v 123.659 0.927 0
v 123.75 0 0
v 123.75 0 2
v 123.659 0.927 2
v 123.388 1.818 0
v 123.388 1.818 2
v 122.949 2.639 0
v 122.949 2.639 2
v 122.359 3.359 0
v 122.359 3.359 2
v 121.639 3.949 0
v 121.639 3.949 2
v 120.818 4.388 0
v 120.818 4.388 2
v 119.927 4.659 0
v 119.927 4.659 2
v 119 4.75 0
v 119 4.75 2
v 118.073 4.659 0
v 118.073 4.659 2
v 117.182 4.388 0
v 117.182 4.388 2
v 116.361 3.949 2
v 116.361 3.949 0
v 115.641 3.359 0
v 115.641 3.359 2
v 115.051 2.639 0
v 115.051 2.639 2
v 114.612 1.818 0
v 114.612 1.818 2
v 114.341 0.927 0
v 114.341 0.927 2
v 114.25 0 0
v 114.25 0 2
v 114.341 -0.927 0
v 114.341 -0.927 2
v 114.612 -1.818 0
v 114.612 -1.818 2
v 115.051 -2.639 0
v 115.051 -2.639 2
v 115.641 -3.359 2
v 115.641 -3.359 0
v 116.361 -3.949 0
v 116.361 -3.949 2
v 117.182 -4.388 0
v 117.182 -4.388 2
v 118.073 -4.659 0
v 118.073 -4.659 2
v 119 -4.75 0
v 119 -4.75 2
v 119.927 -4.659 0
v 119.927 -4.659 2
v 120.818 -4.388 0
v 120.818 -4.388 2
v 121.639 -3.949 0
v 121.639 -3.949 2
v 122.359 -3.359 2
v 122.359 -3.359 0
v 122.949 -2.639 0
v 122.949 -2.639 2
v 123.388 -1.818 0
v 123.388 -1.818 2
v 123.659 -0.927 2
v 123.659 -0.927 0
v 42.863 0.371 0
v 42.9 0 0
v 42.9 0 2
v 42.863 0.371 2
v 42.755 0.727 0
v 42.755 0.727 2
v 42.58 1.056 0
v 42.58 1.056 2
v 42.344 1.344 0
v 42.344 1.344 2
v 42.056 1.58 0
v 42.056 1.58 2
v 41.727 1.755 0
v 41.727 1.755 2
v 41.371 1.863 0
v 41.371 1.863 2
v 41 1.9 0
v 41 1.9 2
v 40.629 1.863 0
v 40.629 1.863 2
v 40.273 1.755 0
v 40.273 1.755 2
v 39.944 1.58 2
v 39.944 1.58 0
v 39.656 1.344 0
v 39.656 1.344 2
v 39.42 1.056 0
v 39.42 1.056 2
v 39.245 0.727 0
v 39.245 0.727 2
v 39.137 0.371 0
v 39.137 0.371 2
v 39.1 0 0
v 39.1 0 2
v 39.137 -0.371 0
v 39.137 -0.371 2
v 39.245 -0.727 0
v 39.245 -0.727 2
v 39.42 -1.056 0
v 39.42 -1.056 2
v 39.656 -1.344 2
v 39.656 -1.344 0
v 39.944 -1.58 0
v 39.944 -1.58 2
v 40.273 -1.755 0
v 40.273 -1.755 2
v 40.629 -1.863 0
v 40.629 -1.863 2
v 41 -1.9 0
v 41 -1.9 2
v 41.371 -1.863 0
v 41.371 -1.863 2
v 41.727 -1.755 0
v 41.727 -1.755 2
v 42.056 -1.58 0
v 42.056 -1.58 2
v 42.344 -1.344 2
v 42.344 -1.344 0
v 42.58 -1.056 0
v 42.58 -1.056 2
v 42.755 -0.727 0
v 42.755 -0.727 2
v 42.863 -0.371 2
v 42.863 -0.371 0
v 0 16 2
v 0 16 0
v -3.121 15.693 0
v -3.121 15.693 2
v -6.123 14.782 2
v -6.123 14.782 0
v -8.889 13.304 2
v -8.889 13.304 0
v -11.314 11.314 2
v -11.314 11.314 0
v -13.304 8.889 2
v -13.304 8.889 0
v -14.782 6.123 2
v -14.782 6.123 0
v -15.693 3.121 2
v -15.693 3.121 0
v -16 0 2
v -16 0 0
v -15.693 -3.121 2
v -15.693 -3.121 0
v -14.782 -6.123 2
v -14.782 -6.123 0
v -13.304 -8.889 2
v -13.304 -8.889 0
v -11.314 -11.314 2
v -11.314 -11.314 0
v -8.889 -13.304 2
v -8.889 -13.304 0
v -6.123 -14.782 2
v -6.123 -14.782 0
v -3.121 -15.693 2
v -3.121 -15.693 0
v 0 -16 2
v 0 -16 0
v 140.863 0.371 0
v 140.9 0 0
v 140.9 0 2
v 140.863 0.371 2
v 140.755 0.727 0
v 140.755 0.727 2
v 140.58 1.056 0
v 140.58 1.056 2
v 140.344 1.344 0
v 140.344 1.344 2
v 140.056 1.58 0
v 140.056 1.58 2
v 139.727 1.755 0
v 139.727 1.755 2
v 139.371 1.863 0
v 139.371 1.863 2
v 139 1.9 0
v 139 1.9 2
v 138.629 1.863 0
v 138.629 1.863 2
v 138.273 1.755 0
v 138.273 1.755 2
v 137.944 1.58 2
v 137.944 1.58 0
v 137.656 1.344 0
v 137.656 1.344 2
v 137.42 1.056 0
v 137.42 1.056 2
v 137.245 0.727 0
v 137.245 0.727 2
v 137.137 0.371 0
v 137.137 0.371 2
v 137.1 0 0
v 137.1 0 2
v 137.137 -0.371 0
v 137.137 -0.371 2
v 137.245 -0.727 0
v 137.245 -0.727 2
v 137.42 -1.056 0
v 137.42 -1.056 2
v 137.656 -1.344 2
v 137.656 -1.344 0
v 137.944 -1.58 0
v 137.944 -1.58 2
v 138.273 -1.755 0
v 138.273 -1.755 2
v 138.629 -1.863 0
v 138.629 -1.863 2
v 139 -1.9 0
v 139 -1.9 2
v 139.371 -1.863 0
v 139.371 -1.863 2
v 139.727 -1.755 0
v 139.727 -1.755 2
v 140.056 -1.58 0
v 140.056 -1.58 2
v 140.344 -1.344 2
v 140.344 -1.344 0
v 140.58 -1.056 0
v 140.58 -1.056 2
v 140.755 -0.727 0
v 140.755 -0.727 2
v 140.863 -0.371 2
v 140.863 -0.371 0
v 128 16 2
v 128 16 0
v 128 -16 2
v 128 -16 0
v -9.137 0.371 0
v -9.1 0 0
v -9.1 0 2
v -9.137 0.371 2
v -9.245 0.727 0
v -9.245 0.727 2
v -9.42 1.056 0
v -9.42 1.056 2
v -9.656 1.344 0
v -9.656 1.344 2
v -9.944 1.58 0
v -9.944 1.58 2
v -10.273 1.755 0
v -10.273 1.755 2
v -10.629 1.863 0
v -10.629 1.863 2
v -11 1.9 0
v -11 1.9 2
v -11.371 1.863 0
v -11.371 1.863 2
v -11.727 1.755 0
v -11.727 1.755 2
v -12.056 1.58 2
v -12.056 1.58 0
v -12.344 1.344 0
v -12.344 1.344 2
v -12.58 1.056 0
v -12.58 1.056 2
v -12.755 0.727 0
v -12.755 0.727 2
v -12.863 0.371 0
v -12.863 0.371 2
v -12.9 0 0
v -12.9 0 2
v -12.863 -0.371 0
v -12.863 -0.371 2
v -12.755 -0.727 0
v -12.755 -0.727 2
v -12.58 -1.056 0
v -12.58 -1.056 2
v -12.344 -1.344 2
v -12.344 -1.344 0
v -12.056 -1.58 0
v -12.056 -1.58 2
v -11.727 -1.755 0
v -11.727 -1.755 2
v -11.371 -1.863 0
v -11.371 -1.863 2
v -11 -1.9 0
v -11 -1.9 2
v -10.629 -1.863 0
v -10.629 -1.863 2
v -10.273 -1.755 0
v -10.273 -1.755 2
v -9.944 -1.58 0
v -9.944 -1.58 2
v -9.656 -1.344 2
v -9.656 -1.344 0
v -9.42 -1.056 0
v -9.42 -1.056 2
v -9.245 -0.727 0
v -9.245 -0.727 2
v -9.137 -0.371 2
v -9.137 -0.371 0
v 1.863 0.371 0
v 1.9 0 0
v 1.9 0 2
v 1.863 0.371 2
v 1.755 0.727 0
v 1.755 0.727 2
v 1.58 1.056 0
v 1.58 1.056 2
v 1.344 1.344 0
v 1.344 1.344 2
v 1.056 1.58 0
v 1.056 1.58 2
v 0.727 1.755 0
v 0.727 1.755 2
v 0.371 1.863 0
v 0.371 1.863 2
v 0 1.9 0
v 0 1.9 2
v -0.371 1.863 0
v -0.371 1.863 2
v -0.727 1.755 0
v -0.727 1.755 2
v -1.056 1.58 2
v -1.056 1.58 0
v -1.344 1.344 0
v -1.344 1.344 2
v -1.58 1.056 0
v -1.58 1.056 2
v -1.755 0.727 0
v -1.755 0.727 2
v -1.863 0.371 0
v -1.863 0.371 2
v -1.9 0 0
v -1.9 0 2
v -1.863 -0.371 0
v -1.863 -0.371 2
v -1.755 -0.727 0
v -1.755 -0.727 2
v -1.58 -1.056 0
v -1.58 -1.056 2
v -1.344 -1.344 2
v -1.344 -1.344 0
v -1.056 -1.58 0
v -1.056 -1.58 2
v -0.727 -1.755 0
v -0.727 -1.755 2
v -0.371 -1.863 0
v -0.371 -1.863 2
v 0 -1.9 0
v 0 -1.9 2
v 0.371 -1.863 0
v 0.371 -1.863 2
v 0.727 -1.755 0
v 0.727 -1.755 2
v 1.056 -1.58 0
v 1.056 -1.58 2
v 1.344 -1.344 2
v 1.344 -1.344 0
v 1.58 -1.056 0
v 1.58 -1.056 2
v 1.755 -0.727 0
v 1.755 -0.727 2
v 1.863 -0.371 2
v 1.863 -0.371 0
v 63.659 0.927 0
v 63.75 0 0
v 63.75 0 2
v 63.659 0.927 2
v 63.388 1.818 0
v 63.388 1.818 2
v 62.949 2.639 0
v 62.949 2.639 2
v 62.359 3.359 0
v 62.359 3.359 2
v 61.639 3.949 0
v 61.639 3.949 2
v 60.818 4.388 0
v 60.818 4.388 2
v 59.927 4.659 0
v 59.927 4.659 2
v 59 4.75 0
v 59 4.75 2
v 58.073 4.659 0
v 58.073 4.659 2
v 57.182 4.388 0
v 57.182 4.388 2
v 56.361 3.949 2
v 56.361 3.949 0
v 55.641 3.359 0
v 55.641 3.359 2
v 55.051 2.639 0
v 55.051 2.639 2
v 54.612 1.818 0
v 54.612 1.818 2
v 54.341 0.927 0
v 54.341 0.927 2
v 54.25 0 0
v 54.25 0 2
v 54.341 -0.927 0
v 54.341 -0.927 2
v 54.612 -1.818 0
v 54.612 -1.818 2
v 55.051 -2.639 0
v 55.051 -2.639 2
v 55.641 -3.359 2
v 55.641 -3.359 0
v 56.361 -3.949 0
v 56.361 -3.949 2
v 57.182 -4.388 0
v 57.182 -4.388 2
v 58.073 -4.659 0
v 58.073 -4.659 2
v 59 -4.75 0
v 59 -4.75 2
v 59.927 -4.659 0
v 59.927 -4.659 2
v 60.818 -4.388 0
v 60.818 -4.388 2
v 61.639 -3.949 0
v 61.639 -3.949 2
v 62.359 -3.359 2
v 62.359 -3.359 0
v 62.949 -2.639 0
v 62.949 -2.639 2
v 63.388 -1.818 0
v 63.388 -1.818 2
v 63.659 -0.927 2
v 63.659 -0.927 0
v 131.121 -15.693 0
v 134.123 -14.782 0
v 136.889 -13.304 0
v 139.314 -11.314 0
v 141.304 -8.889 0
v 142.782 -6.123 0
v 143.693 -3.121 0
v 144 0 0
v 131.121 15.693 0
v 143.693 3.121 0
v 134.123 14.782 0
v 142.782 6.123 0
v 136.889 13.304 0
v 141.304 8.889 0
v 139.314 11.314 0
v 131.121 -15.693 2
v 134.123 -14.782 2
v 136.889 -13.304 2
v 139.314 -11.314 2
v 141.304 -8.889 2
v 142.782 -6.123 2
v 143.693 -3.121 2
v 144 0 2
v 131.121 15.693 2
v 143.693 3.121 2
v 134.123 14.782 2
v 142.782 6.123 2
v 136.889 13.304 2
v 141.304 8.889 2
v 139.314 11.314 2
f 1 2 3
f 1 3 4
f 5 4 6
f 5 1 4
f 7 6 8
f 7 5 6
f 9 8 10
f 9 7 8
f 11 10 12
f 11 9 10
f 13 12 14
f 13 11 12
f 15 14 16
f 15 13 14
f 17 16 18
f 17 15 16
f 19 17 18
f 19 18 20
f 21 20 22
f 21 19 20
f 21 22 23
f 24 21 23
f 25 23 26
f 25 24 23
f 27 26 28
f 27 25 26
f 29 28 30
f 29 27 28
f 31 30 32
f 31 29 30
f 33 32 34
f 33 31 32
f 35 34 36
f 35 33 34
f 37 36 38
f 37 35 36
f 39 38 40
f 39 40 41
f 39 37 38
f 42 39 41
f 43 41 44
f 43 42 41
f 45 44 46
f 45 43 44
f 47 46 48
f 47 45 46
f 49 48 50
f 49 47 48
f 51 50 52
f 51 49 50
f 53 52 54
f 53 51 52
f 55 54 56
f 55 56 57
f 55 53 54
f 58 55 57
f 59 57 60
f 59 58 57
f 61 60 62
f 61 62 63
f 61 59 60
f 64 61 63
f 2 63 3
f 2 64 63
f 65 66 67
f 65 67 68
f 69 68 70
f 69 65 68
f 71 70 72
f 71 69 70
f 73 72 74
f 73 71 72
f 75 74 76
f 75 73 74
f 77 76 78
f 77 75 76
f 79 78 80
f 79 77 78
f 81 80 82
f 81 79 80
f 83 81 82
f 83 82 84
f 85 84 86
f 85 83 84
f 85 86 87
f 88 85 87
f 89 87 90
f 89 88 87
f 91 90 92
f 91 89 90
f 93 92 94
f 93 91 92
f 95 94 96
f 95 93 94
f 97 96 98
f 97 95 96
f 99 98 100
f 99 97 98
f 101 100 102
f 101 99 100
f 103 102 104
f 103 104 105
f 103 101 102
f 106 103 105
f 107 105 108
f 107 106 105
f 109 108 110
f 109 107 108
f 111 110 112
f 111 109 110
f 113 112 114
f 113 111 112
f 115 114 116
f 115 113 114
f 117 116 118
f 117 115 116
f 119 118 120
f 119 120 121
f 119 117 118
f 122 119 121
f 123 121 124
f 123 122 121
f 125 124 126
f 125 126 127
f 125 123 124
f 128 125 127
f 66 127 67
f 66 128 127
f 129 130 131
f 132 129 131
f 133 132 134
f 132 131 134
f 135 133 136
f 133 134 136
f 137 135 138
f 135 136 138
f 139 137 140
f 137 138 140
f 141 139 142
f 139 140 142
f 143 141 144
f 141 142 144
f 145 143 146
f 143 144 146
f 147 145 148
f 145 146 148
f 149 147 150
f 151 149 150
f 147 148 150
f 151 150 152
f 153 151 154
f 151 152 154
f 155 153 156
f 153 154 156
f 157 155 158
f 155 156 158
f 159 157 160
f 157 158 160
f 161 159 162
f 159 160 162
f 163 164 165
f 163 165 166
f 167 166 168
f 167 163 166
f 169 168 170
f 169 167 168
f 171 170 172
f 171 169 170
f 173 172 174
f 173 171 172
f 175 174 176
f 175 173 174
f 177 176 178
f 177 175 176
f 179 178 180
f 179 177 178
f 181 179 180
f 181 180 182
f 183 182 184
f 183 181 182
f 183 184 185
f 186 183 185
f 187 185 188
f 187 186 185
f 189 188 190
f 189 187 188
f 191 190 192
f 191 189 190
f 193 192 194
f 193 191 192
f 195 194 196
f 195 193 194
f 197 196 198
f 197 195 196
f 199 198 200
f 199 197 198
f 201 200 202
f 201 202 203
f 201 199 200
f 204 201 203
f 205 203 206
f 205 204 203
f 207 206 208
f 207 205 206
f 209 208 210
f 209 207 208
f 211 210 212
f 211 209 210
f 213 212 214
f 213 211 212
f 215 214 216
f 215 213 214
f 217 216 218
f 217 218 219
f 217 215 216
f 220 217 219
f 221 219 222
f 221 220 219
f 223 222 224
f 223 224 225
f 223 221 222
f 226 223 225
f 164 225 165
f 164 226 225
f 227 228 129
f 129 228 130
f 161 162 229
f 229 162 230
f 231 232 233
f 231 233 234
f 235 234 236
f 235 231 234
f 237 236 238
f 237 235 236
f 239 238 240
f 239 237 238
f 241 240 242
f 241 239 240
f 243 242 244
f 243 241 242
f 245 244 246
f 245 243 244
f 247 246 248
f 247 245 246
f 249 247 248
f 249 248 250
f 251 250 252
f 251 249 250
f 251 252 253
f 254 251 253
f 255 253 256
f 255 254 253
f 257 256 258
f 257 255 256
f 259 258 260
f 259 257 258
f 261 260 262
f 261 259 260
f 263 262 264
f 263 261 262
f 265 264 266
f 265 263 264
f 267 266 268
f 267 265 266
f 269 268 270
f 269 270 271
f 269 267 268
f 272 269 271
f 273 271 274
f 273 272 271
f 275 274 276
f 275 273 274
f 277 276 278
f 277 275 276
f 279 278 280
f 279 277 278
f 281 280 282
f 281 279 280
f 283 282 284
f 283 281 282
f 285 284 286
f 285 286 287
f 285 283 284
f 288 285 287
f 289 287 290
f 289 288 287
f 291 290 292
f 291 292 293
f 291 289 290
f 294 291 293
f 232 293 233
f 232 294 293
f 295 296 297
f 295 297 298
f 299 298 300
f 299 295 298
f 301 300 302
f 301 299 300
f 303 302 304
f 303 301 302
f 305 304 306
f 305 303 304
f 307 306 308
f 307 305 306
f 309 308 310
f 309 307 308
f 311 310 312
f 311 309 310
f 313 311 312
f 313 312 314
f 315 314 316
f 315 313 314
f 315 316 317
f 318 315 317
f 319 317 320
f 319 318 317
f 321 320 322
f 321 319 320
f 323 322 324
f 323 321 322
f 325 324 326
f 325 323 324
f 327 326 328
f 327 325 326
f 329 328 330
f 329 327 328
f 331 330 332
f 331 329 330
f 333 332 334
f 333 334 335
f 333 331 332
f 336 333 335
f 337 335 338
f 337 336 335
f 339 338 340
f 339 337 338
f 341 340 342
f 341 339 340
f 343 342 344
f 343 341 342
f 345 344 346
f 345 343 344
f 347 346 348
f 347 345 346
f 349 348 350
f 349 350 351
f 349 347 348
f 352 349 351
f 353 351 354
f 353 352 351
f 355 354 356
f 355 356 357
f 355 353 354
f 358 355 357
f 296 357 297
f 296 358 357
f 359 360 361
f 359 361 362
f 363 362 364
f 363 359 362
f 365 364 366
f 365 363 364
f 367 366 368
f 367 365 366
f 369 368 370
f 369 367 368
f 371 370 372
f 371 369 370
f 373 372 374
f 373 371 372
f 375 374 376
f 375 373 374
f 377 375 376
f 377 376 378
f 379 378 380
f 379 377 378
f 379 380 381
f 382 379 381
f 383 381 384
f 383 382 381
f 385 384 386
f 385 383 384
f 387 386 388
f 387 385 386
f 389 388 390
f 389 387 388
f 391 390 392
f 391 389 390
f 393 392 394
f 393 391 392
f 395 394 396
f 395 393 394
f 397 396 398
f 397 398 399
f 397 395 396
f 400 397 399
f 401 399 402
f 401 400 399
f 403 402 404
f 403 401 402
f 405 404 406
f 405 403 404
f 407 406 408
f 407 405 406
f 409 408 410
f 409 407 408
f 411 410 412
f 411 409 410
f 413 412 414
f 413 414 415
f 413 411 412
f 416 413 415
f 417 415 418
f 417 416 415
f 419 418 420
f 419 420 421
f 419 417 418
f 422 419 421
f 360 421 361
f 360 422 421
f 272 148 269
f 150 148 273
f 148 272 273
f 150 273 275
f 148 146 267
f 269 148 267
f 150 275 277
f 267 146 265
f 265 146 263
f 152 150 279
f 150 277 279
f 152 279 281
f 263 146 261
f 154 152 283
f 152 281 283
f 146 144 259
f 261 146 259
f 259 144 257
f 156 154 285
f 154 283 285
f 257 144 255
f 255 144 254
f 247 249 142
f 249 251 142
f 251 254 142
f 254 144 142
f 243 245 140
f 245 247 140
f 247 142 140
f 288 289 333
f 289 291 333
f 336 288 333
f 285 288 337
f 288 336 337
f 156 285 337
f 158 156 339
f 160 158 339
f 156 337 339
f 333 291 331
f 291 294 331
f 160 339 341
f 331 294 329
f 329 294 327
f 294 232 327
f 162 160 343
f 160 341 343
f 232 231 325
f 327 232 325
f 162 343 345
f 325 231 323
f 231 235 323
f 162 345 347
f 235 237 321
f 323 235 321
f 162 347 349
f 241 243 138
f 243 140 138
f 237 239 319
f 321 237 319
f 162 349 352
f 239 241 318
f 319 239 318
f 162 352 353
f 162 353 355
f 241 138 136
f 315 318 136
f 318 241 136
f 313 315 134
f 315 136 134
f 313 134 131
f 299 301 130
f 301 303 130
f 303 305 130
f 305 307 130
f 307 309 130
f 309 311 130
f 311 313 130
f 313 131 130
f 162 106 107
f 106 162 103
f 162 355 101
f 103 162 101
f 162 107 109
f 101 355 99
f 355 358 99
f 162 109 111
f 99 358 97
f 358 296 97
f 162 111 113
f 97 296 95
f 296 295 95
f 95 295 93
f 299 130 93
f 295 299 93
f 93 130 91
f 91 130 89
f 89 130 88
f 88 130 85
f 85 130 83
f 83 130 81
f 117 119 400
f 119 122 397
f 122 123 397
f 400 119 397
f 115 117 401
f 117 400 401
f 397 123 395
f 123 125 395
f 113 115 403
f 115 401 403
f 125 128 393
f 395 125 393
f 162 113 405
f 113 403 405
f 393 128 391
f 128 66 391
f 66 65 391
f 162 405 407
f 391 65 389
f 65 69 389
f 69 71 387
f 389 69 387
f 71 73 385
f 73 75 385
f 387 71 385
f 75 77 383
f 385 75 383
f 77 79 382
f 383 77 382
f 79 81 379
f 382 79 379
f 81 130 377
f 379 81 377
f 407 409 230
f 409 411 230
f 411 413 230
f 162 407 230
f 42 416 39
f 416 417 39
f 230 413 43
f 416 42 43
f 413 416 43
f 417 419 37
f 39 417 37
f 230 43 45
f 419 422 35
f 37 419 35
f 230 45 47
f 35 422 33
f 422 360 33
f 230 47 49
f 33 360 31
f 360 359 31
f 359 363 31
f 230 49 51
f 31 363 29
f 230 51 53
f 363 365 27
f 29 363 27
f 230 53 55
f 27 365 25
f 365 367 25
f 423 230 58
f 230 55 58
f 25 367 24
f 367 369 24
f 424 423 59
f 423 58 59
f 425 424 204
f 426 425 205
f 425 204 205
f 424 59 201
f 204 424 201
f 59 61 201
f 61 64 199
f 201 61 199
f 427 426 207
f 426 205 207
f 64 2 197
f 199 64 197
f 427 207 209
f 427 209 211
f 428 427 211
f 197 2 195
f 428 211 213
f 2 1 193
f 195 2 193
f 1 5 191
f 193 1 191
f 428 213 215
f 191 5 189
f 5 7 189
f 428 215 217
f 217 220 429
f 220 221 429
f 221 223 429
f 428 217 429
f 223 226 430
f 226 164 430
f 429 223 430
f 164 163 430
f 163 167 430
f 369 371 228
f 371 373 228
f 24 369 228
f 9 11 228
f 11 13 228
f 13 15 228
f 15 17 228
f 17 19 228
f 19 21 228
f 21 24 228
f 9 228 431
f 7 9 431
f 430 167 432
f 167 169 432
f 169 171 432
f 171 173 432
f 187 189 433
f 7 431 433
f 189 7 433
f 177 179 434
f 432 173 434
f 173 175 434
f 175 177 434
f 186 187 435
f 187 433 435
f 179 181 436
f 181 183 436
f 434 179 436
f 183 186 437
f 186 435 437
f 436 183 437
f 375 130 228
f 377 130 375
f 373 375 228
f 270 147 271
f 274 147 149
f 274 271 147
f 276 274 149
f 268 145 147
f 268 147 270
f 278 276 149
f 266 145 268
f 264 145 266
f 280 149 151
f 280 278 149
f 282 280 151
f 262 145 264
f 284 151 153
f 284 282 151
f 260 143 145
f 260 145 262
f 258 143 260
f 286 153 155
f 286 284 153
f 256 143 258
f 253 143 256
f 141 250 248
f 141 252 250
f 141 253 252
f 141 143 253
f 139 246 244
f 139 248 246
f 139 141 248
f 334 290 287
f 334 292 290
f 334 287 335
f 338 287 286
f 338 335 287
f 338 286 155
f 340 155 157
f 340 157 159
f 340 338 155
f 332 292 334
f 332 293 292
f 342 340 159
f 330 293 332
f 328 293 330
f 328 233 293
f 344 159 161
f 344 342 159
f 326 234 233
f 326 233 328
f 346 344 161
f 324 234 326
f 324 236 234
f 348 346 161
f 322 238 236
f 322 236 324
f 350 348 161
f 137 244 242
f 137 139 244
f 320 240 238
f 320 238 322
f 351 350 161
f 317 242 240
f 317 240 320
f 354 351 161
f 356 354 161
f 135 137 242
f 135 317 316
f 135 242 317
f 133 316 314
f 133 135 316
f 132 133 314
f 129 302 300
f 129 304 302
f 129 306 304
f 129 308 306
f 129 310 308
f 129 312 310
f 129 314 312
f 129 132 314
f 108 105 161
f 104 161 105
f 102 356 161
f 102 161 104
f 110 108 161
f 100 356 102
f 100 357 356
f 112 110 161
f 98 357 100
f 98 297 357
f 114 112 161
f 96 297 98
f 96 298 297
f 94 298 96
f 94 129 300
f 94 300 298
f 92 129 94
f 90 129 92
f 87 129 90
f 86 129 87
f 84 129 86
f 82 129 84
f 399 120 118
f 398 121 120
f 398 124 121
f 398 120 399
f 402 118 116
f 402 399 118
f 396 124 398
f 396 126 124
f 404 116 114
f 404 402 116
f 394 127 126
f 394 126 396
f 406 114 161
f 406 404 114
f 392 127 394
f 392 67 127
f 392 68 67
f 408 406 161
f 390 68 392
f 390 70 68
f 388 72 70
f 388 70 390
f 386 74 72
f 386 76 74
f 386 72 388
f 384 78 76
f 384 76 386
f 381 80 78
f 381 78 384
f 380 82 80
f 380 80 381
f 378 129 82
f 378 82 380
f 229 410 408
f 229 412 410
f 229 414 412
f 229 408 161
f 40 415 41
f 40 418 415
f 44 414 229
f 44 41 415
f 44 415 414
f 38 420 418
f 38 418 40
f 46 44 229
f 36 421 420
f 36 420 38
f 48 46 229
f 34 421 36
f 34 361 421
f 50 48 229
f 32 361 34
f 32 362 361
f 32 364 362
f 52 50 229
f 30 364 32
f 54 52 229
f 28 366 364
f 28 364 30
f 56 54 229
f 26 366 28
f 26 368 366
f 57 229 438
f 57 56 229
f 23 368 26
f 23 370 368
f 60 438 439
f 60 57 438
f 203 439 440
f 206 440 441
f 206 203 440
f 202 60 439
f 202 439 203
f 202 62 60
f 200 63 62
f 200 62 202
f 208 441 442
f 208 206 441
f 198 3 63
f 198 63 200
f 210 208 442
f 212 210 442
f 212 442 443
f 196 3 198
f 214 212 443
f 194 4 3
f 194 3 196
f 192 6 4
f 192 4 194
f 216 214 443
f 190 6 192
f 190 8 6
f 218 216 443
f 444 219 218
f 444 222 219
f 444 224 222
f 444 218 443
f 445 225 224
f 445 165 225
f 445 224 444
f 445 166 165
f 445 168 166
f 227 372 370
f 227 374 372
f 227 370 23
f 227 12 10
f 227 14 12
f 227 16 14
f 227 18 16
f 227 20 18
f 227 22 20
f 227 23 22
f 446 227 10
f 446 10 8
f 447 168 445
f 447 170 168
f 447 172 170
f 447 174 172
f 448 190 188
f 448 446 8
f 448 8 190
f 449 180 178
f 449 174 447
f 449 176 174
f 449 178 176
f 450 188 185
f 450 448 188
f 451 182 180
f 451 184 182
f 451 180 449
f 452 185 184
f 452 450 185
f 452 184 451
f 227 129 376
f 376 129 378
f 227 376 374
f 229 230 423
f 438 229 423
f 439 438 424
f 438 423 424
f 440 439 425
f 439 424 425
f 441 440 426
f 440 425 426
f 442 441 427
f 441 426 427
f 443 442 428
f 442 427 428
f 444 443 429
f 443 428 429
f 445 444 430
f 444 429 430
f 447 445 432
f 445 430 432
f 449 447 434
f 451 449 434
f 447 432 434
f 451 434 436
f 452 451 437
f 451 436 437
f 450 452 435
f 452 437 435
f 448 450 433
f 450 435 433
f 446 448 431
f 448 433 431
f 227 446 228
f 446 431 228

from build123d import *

# Parameters (mm, degrees)
F0_R     = 1.9
F0_R_2   = 4.75
F1_DEPTH = 2


with BuildPart() as f1:
    # F0 (on Top) → F1 (new body)
    with BuildSketch(Plane.XY):
        with BuildLine():
            Line((128, 16), (0, 16))
            ThreePointArc((0, 16), (-16, 0), (0, -16))
            Line((0, -16), (128, -16))
            ThreePointArc((128, -16), (144, 0), (128, 16))
        make_face()
        with Locations((-11, 0)):
            Circle(F0_R, mode=Mode.SUBTRACT)
        Circle(F0_R, mode=Mode.SUBTRACT)
        with Locations((41, 0)):
            Circle(F0_R, mode=Mode.SUBTRACT)
        with Locations((59, 0)):
            Circle(F0_R_2, mode=Mode.SUBTRACT)
        with Locations((119, 0)):
            Circle(F0_R_2, mode=Mode.SUBTRACT)
        with Locations((139, 0)):
            Circle(F0_R, mode=Mode.SUBTRACT)
    extrude(amount=F1_DEPTH)


solid = f1.part
